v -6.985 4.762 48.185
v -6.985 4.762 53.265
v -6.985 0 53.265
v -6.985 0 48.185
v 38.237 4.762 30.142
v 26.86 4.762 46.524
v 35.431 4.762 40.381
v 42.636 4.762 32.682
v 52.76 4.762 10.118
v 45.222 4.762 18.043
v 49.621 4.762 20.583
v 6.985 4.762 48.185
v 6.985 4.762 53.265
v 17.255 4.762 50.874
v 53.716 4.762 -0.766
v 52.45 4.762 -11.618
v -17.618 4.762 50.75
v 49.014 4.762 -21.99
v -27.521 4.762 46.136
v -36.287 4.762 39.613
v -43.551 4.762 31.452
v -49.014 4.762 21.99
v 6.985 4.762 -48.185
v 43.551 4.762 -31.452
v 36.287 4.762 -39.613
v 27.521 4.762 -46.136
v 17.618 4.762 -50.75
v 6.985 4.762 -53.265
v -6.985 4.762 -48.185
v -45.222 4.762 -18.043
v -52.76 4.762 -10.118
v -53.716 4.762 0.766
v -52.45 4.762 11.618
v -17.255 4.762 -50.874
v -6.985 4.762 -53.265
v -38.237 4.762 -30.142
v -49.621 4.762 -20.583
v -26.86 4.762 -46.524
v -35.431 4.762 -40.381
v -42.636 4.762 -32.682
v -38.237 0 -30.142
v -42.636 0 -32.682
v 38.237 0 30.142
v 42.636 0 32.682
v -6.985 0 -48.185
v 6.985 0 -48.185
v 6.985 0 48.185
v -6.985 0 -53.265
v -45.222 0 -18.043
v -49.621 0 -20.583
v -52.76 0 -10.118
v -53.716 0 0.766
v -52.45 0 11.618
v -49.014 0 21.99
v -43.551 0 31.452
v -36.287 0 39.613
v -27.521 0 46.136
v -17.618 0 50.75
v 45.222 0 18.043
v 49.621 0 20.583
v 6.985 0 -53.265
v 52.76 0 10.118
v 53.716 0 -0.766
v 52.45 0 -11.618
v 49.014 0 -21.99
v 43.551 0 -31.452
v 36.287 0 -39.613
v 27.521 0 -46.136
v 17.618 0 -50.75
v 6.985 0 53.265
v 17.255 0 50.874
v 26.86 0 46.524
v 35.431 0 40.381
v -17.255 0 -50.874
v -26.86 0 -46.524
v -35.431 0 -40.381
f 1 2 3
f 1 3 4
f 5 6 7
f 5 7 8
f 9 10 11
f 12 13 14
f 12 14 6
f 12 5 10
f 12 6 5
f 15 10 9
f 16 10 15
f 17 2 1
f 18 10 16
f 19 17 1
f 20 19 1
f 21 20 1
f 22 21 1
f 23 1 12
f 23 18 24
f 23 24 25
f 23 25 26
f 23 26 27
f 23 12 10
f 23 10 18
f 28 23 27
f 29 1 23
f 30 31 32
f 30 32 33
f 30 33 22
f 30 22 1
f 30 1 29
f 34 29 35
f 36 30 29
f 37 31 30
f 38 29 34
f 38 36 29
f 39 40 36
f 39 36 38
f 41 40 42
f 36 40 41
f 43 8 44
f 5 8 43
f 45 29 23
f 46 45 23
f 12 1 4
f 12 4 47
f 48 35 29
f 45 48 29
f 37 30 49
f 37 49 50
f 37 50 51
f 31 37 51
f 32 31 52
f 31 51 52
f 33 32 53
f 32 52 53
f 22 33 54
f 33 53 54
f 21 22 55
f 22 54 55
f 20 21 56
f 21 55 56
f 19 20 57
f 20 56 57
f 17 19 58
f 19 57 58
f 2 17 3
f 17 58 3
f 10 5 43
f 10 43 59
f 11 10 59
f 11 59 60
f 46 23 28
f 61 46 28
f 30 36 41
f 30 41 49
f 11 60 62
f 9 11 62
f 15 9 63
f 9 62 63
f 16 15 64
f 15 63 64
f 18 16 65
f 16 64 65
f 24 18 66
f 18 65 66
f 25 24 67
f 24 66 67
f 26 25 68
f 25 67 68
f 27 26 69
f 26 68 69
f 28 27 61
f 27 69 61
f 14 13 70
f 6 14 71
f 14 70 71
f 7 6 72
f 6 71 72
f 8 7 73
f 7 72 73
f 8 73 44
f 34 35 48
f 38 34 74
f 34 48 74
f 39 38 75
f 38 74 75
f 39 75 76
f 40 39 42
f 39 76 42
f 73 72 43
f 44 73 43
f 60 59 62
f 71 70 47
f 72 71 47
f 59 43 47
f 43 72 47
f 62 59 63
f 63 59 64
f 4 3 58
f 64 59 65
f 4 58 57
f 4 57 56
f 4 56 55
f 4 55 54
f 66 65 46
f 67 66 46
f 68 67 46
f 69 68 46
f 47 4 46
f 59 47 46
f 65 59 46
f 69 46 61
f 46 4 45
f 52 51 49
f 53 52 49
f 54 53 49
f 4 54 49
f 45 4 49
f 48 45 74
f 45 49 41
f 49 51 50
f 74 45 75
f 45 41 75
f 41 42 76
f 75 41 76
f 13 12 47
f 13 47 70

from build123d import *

# Parameters (mm, degrees)
SKETCH1_R           = 53.721
BOSS_EXTRUDE1_DEPTH = 4.7625
CUT_EXTRUDE1_REACH  = 78.122
CUT_EXTRUDE2_REACH  = 77.801


with BuildPart() as part:
    # Sketch1 → Boss-Extrude1 (new body)
    with BuildSketch(Plane(origin=(0, 0, 0), x_dir=(1, 0, 0), z_dir=(0, 1, 0))):
        with Locations(Location((0, 0, 0), (0, 0, 90))):
            Circle(SKETCH1_R)
    extrude(amount=BOSS_EXTRUDE1_DEPTH)

    # Sketch2 → Cut-Extrude1 (cut, up to next)
    with BuildSketch(Plane(origin=(0, 4.7625, 0), x_dir=(1, 0, 0), z_dir=(0, 1, 0)), mode=Mode.PRIVATE) as cut_extrude1_sk1:
        with BuildLine():
            Line((-6.985, -48.184956735), (6.985, -48.184956735))
            Line((6.985, -48.184956735), (6.985, -53.264956735))
            ThreePointArc((6.985, -53.264956735), (0, -53.721), (-6.985, -53.264956735))
            Line((-6.985, -53.264956735), (-6.985, -48.184956735))
        make_face()
    cut_extrude1_tool1 = extrude(cut_extrude1_sk1.sketch, amount=-CUT_EXTRUDE1_REACH, mode=Mode.PRIVATE) & part.part
    # Sketch2 → Cut-Extrude1 (cut, up to next)
    with BuildSketch(Plane(origin=(0, 4.7625, 0), x_dir=(1, 0, 0), z_dir=(0, 1, 0)), mode=Mode.PRIVATE) as cut_extrude1_sk2:
        with BuildLine():
            Line((6.985, 48.184956735), (6.985, 53.264956735))
            ThreePointArc((6.985, 53.264956735), (0, 53.721), (-6.985, 53.264956735))
            Line((-6.985, 53.264956735), (-6.985, 48.184956735))
            Line((-6.985, 48.184956735), (6.985, 48.184956735))
        make_face()
    cut_extrude1_tool2 = extrude(cut_extrude1_sk2.sketch, amount=-CUT_EXTRUDE1_REACH, mode=Mode.PRIVATE) & part.part
    add(cut_extrude1_tool1.solids().sort_by_distance((0, 4.7625, 50.878815))[0], mode=Mode.SUBTRACT)
    add(cut_extrude1_tool2.solids().sort_by_distance((0, 4.7625, -50.878815))[0], mode=Mode.SUBTRACT)

    # Sketch3 → Cut-Extrude2 (cut, up to next)
    with BuildSketch(Plane(origin=(0, 4.7625, 0), x_dir=(1, 0, 0), z_dir=(0, 1, 0)), mode=Mode.PRIVATE) as cut_extrude2_sk1:
        with BuildLine():
            Line((38.236896613, -30.141665813), (45.221896613, -18.043290922))
            Line((45.221896613, -18.043290922), (49.621305664, -20.583290922))
            ThreePointArc((49.621305664, -20.583290922), (46.523750717, -26.8605), (42.636305664, -32.681665813))
            Line((42.636305664, -32.681665813), (38.236896613, -30.141665813))
        make_face()
    cut_extrude2_tool1 = extrude(cut_extrude2_sk1.sketch, amount=-CUT_EXTRUDE2_REACH, mode=Mode.PRIVATE) & part.part
    # Sketch3 → Cut-Extrude2 (cut, up to next)
    with BuildSketch(Plane(origin=(0, 4.7625, 0), x_dir=(1, 0, 0), z_dir=(0, 1, 0)), mode=Mode.PRIVATE) as cut_extrude2_sk2:
        with BuildLine():
            Line((-45.221896613, 18.043290922), (-49.621305664, 20.583290922))
            ThreePointArc((-49.621305664, 20.583290922), (-46.523750717, 26.8605), (-42.636305664, 32.681665813))
            Line((-42.636305664, 32.681665813), (-38.236896613, 30.141665813))
            Line((-38.236896613, 30.141665813), (-45.221896613, 18.043290922))
        make_face()
    cut_extrude2_tool2 = extrude(cut_extrude2_sk2.sketch, amount=-CUT_EXTRUDE2_REACH, mode=Mode.PRIVATE) & part.part
    add(cut_extrude2_tool1.solids().sort_by_distance((44.062347, 4.7625, 25.439408))[0], mode=Mode.SUBTRACT)
    add(cut_extrude2_tool2.solids().sort_by_distance((-44.062347, 4.7625, -25.439408))[0], mode=Mode.SUBTRACT)


solid = part.part
